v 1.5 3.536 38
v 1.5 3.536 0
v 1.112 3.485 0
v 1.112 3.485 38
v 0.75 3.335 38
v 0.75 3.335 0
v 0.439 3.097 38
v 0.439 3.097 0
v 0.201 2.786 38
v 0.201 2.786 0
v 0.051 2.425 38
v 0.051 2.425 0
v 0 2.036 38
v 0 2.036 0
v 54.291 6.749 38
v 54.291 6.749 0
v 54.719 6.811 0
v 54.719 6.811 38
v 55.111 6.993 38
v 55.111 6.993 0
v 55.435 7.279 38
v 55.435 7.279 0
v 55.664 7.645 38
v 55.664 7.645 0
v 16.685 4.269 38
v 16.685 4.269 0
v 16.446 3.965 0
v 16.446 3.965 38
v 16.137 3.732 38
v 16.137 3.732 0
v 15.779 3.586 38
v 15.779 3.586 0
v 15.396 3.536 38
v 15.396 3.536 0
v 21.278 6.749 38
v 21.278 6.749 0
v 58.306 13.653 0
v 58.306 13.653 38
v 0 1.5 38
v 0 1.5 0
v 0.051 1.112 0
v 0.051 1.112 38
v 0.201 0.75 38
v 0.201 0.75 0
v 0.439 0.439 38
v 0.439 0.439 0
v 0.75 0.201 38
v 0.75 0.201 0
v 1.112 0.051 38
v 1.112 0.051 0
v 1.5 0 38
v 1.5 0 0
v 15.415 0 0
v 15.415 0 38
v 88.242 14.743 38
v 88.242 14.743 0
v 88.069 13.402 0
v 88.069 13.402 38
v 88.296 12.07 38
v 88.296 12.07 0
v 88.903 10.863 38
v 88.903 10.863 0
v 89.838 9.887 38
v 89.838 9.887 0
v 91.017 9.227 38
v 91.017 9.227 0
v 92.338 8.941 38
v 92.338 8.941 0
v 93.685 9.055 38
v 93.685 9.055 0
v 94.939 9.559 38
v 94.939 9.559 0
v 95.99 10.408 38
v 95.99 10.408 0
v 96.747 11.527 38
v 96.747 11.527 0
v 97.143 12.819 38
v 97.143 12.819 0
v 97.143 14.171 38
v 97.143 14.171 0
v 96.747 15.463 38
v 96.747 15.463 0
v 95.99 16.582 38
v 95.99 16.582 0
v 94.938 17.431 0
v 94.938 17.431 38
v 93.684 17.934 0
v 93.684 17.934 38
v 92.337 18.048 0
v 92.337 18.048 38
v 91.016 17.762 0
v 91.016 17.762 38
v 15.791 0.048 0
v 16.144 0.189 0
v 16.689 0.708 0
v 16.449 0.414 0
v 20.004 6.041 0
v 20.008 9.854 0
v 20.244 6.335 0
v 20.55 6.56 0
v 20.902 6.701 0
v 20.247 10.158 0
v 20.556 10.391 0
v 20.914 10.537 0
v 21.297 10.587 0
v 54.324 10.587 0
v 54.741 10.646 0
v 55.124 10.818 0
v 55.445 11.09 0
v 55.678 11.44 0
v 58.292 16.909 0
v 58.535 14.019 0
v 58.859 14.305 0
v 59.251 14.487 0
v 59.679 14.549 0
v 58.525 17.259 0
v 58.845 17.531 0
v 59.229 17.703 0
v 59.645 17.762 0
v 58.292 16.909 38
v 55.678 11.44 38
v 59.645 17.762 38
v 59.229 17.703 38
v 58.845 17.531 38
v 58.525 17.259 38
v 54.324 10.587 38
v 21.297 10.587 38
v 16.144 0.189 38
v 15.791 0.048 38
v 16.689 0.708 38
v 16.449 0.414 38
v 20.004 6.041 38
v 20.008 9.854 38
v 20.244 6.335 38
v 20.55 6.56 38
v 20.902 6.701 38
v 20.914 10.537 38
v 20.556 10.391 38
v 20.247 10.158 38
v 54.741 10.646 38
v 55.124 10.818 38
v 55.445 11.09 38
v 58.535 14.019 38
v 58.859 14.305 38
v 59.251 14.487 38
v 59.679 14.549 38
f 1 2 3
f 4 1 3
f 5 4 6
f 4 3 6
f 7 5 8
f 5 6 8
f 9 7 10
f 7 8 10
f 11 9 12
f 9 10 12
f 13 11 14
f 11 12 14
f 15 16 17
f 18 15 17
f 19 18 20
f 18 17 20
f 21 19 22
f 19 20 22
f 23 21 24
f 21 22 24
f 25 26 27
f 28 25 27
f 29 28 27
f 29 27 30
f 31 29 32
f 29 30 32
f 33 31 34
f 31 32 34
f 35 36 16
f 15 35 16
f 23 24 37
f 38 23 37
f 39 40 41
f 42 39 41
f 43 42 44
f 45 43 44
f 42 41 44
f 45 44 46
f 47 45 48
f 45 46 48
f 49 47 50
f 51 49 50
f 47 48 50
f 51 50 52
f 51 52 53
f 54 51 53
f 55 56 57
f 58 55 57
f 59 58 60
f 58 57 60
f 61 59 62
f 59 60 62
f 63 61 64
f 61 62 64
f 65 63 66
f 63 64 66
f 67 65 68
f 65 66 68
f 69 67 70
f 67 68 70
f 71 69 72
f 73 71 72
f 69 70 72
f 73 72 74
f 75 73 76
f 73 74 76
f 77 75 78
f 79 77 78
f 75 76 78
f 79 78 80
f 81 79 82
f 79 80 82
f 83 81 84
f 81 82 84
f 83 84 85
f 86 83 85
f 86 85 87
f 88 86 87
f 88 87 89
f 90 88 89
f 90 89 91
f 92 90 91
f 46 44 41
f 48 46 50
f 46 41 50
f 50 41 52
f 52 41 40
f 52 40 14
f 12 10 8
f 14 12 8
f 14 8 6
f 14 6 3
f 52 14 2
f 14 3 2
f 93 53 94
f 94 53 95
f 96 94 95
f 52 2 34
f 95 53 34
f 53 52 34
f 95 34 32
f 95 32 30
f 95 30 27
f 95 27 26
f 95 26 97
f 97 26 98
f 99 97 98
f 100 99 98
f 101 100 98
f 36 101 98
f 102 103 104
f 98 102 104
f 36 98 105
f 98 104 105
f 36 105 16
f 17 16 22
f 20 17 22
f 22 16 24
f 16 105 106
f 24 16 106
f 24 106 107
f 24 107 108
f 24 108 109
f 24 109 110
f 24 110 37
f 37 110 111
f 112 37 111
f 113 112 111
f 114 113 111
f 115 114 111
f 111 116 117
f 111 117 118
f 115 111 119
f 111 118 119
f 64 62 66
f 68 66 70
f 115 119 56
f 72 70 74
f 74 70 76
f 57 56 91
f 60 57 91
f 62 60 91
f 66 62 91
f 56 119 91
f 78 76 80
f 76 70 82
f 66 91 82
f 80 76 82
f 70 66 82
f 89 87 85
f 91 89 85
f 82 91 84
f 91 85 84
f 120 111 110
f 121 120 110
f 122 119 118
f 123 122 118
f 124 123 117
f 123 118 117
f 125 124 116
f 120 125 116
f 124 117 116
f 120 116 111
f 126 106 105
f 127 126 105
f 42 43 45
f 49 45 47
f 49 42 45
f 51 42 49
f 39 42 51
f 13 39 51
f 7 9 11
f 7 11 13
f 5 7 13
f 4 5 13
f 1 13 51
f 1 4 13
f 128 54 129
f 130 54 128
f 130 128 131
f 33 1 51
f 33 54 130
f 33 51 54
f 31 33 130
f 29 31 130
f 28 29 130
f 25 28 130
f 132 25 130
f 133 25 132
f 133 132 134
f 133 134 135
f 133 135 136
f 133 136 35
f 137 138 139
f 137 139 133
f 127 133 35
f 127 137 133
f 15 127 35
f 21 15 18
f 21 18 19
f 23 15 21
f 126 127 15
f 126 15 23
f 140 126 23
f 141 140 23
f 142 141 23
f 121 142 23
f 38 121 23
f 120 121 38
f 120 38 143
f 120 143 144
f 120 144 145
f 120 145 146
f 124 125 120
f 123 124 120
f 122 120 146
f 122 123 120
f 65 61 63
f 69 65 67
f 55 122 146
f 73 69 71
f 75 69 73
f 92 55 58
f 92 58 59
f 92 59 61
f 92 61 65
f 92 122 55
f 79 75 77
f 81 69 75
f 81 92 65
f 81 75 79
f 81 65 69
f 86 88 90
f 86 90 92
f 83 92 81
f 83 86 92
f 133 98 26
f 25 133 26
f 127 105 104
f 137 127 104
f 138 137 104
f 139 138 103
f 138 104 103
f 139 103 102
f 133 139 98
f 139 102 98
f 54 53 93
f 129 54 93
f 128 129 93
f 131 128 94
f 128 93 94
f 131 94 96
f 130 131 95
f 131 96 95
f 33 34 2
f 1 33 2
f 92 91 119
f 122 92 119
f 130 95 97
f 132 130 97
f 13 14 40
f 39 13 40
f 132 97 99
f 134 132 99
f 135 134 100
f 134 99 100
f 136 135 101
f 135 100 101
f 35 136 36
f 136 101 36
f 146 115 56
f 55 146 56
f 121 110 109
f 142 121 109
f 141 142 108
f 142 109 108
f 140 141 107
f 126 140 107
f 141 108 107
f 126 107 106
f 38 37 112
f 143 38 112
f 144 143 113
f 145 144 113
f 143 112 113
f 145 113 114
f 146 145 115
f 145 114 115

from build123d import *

# Parameters (mm, degrees)
SKETCH_3_R      = 4.562700836
EXTRUDE_3_DEPTH = 38


with BuildPart() as part:
    # 草图3 → 凸台-拉伸3 (new body)
    with BuildSketch(Plane.XY):
        with Locations((92.630544214, 13.494641075)):
            Circle(SKETCH_3_R)
        with BuildLine():
            ThreePointArc((91.130544214, 14.762196375), (92.191204386, 15.201536203), (92.630544214, 16.262196375))
            ThreePointArc((92.630544214, 16.262196375), (92.191204386, 17.322856547), (91.130544214, 17.762196375))
            Line((91.130544214, 17.762196375), (59.64523969, 17.762196375))
            ThreePointArc((59.64523969, 17.762196375), (58.845330036, 17.531111086), (58.291883519, 16.909055768))
            Line((58.291883519, 16.909055768), (55.677790218, 11.439862088))
            ThreePointArc((55.677790218, 11.439862088), (55.124343701, 10.817806769), (54.324434046, 10.586721481))
            Line((54.324434046, 10.586721481), (21.297445186, 10.586721481))
            ThreePointArc((21.297445186, 10.586721481), (20.556052671, 10.390691242), (20.008440624, 9.853837664))
            Line((20.008440624, 9.853837664), (16.684963935, 4.269316435))
            ThreePointArc((16.684963935, 4.269316435), (16.137351889, 3.732462858), (15.395959373, 3.536432619))
            Line((15.395959373, 3.536432619), (1.5, 3.536432619))
            ThreePointArc((1.5, 3.536432619), (0.439339828, 3.09709279), (0, 2.036432619))
            Line((0, 2.036432619), (0, 1.5))
            ThreePointArc((0, 1.5), (0.439339828, 0.439339828), (1.5, 0))
            Line((1.5, 0), (15.415084557, 0))
            ThreePointArc((15.415084557, 0), (16.143809475, 0.188908854), (16.688984275, 0.708053342))
            Line((16.688984275, 0.708053342), (20.004420285, 6.041156217))
            ThreePointArc((20.004420285, 6.041156217), (20.549595084, 6.560300705), (21.278320002, 6.749209559))
            Line((21.278320002, 6.749209559), (54.290974396, 6.749209559))
            ThreePointArc((54.290974396, 6.749209559), (55.110835464, 6.99309339), (55.664095388, 7.645439121))
            Line((55.664095388, 7.645439121), (58.305578349, 13.652814563))
            ThreePointArc((58.305578349, 13.652814563), (58.858838273, 14.305160293), (59.678699341, 14.549044125))
            Line((59.678699341, 14.549044125), (91.130544214, 14.762196375))
        make_face()
    extrude(amount=EXTRUDE_3_DEPTH)


solid = part.part
